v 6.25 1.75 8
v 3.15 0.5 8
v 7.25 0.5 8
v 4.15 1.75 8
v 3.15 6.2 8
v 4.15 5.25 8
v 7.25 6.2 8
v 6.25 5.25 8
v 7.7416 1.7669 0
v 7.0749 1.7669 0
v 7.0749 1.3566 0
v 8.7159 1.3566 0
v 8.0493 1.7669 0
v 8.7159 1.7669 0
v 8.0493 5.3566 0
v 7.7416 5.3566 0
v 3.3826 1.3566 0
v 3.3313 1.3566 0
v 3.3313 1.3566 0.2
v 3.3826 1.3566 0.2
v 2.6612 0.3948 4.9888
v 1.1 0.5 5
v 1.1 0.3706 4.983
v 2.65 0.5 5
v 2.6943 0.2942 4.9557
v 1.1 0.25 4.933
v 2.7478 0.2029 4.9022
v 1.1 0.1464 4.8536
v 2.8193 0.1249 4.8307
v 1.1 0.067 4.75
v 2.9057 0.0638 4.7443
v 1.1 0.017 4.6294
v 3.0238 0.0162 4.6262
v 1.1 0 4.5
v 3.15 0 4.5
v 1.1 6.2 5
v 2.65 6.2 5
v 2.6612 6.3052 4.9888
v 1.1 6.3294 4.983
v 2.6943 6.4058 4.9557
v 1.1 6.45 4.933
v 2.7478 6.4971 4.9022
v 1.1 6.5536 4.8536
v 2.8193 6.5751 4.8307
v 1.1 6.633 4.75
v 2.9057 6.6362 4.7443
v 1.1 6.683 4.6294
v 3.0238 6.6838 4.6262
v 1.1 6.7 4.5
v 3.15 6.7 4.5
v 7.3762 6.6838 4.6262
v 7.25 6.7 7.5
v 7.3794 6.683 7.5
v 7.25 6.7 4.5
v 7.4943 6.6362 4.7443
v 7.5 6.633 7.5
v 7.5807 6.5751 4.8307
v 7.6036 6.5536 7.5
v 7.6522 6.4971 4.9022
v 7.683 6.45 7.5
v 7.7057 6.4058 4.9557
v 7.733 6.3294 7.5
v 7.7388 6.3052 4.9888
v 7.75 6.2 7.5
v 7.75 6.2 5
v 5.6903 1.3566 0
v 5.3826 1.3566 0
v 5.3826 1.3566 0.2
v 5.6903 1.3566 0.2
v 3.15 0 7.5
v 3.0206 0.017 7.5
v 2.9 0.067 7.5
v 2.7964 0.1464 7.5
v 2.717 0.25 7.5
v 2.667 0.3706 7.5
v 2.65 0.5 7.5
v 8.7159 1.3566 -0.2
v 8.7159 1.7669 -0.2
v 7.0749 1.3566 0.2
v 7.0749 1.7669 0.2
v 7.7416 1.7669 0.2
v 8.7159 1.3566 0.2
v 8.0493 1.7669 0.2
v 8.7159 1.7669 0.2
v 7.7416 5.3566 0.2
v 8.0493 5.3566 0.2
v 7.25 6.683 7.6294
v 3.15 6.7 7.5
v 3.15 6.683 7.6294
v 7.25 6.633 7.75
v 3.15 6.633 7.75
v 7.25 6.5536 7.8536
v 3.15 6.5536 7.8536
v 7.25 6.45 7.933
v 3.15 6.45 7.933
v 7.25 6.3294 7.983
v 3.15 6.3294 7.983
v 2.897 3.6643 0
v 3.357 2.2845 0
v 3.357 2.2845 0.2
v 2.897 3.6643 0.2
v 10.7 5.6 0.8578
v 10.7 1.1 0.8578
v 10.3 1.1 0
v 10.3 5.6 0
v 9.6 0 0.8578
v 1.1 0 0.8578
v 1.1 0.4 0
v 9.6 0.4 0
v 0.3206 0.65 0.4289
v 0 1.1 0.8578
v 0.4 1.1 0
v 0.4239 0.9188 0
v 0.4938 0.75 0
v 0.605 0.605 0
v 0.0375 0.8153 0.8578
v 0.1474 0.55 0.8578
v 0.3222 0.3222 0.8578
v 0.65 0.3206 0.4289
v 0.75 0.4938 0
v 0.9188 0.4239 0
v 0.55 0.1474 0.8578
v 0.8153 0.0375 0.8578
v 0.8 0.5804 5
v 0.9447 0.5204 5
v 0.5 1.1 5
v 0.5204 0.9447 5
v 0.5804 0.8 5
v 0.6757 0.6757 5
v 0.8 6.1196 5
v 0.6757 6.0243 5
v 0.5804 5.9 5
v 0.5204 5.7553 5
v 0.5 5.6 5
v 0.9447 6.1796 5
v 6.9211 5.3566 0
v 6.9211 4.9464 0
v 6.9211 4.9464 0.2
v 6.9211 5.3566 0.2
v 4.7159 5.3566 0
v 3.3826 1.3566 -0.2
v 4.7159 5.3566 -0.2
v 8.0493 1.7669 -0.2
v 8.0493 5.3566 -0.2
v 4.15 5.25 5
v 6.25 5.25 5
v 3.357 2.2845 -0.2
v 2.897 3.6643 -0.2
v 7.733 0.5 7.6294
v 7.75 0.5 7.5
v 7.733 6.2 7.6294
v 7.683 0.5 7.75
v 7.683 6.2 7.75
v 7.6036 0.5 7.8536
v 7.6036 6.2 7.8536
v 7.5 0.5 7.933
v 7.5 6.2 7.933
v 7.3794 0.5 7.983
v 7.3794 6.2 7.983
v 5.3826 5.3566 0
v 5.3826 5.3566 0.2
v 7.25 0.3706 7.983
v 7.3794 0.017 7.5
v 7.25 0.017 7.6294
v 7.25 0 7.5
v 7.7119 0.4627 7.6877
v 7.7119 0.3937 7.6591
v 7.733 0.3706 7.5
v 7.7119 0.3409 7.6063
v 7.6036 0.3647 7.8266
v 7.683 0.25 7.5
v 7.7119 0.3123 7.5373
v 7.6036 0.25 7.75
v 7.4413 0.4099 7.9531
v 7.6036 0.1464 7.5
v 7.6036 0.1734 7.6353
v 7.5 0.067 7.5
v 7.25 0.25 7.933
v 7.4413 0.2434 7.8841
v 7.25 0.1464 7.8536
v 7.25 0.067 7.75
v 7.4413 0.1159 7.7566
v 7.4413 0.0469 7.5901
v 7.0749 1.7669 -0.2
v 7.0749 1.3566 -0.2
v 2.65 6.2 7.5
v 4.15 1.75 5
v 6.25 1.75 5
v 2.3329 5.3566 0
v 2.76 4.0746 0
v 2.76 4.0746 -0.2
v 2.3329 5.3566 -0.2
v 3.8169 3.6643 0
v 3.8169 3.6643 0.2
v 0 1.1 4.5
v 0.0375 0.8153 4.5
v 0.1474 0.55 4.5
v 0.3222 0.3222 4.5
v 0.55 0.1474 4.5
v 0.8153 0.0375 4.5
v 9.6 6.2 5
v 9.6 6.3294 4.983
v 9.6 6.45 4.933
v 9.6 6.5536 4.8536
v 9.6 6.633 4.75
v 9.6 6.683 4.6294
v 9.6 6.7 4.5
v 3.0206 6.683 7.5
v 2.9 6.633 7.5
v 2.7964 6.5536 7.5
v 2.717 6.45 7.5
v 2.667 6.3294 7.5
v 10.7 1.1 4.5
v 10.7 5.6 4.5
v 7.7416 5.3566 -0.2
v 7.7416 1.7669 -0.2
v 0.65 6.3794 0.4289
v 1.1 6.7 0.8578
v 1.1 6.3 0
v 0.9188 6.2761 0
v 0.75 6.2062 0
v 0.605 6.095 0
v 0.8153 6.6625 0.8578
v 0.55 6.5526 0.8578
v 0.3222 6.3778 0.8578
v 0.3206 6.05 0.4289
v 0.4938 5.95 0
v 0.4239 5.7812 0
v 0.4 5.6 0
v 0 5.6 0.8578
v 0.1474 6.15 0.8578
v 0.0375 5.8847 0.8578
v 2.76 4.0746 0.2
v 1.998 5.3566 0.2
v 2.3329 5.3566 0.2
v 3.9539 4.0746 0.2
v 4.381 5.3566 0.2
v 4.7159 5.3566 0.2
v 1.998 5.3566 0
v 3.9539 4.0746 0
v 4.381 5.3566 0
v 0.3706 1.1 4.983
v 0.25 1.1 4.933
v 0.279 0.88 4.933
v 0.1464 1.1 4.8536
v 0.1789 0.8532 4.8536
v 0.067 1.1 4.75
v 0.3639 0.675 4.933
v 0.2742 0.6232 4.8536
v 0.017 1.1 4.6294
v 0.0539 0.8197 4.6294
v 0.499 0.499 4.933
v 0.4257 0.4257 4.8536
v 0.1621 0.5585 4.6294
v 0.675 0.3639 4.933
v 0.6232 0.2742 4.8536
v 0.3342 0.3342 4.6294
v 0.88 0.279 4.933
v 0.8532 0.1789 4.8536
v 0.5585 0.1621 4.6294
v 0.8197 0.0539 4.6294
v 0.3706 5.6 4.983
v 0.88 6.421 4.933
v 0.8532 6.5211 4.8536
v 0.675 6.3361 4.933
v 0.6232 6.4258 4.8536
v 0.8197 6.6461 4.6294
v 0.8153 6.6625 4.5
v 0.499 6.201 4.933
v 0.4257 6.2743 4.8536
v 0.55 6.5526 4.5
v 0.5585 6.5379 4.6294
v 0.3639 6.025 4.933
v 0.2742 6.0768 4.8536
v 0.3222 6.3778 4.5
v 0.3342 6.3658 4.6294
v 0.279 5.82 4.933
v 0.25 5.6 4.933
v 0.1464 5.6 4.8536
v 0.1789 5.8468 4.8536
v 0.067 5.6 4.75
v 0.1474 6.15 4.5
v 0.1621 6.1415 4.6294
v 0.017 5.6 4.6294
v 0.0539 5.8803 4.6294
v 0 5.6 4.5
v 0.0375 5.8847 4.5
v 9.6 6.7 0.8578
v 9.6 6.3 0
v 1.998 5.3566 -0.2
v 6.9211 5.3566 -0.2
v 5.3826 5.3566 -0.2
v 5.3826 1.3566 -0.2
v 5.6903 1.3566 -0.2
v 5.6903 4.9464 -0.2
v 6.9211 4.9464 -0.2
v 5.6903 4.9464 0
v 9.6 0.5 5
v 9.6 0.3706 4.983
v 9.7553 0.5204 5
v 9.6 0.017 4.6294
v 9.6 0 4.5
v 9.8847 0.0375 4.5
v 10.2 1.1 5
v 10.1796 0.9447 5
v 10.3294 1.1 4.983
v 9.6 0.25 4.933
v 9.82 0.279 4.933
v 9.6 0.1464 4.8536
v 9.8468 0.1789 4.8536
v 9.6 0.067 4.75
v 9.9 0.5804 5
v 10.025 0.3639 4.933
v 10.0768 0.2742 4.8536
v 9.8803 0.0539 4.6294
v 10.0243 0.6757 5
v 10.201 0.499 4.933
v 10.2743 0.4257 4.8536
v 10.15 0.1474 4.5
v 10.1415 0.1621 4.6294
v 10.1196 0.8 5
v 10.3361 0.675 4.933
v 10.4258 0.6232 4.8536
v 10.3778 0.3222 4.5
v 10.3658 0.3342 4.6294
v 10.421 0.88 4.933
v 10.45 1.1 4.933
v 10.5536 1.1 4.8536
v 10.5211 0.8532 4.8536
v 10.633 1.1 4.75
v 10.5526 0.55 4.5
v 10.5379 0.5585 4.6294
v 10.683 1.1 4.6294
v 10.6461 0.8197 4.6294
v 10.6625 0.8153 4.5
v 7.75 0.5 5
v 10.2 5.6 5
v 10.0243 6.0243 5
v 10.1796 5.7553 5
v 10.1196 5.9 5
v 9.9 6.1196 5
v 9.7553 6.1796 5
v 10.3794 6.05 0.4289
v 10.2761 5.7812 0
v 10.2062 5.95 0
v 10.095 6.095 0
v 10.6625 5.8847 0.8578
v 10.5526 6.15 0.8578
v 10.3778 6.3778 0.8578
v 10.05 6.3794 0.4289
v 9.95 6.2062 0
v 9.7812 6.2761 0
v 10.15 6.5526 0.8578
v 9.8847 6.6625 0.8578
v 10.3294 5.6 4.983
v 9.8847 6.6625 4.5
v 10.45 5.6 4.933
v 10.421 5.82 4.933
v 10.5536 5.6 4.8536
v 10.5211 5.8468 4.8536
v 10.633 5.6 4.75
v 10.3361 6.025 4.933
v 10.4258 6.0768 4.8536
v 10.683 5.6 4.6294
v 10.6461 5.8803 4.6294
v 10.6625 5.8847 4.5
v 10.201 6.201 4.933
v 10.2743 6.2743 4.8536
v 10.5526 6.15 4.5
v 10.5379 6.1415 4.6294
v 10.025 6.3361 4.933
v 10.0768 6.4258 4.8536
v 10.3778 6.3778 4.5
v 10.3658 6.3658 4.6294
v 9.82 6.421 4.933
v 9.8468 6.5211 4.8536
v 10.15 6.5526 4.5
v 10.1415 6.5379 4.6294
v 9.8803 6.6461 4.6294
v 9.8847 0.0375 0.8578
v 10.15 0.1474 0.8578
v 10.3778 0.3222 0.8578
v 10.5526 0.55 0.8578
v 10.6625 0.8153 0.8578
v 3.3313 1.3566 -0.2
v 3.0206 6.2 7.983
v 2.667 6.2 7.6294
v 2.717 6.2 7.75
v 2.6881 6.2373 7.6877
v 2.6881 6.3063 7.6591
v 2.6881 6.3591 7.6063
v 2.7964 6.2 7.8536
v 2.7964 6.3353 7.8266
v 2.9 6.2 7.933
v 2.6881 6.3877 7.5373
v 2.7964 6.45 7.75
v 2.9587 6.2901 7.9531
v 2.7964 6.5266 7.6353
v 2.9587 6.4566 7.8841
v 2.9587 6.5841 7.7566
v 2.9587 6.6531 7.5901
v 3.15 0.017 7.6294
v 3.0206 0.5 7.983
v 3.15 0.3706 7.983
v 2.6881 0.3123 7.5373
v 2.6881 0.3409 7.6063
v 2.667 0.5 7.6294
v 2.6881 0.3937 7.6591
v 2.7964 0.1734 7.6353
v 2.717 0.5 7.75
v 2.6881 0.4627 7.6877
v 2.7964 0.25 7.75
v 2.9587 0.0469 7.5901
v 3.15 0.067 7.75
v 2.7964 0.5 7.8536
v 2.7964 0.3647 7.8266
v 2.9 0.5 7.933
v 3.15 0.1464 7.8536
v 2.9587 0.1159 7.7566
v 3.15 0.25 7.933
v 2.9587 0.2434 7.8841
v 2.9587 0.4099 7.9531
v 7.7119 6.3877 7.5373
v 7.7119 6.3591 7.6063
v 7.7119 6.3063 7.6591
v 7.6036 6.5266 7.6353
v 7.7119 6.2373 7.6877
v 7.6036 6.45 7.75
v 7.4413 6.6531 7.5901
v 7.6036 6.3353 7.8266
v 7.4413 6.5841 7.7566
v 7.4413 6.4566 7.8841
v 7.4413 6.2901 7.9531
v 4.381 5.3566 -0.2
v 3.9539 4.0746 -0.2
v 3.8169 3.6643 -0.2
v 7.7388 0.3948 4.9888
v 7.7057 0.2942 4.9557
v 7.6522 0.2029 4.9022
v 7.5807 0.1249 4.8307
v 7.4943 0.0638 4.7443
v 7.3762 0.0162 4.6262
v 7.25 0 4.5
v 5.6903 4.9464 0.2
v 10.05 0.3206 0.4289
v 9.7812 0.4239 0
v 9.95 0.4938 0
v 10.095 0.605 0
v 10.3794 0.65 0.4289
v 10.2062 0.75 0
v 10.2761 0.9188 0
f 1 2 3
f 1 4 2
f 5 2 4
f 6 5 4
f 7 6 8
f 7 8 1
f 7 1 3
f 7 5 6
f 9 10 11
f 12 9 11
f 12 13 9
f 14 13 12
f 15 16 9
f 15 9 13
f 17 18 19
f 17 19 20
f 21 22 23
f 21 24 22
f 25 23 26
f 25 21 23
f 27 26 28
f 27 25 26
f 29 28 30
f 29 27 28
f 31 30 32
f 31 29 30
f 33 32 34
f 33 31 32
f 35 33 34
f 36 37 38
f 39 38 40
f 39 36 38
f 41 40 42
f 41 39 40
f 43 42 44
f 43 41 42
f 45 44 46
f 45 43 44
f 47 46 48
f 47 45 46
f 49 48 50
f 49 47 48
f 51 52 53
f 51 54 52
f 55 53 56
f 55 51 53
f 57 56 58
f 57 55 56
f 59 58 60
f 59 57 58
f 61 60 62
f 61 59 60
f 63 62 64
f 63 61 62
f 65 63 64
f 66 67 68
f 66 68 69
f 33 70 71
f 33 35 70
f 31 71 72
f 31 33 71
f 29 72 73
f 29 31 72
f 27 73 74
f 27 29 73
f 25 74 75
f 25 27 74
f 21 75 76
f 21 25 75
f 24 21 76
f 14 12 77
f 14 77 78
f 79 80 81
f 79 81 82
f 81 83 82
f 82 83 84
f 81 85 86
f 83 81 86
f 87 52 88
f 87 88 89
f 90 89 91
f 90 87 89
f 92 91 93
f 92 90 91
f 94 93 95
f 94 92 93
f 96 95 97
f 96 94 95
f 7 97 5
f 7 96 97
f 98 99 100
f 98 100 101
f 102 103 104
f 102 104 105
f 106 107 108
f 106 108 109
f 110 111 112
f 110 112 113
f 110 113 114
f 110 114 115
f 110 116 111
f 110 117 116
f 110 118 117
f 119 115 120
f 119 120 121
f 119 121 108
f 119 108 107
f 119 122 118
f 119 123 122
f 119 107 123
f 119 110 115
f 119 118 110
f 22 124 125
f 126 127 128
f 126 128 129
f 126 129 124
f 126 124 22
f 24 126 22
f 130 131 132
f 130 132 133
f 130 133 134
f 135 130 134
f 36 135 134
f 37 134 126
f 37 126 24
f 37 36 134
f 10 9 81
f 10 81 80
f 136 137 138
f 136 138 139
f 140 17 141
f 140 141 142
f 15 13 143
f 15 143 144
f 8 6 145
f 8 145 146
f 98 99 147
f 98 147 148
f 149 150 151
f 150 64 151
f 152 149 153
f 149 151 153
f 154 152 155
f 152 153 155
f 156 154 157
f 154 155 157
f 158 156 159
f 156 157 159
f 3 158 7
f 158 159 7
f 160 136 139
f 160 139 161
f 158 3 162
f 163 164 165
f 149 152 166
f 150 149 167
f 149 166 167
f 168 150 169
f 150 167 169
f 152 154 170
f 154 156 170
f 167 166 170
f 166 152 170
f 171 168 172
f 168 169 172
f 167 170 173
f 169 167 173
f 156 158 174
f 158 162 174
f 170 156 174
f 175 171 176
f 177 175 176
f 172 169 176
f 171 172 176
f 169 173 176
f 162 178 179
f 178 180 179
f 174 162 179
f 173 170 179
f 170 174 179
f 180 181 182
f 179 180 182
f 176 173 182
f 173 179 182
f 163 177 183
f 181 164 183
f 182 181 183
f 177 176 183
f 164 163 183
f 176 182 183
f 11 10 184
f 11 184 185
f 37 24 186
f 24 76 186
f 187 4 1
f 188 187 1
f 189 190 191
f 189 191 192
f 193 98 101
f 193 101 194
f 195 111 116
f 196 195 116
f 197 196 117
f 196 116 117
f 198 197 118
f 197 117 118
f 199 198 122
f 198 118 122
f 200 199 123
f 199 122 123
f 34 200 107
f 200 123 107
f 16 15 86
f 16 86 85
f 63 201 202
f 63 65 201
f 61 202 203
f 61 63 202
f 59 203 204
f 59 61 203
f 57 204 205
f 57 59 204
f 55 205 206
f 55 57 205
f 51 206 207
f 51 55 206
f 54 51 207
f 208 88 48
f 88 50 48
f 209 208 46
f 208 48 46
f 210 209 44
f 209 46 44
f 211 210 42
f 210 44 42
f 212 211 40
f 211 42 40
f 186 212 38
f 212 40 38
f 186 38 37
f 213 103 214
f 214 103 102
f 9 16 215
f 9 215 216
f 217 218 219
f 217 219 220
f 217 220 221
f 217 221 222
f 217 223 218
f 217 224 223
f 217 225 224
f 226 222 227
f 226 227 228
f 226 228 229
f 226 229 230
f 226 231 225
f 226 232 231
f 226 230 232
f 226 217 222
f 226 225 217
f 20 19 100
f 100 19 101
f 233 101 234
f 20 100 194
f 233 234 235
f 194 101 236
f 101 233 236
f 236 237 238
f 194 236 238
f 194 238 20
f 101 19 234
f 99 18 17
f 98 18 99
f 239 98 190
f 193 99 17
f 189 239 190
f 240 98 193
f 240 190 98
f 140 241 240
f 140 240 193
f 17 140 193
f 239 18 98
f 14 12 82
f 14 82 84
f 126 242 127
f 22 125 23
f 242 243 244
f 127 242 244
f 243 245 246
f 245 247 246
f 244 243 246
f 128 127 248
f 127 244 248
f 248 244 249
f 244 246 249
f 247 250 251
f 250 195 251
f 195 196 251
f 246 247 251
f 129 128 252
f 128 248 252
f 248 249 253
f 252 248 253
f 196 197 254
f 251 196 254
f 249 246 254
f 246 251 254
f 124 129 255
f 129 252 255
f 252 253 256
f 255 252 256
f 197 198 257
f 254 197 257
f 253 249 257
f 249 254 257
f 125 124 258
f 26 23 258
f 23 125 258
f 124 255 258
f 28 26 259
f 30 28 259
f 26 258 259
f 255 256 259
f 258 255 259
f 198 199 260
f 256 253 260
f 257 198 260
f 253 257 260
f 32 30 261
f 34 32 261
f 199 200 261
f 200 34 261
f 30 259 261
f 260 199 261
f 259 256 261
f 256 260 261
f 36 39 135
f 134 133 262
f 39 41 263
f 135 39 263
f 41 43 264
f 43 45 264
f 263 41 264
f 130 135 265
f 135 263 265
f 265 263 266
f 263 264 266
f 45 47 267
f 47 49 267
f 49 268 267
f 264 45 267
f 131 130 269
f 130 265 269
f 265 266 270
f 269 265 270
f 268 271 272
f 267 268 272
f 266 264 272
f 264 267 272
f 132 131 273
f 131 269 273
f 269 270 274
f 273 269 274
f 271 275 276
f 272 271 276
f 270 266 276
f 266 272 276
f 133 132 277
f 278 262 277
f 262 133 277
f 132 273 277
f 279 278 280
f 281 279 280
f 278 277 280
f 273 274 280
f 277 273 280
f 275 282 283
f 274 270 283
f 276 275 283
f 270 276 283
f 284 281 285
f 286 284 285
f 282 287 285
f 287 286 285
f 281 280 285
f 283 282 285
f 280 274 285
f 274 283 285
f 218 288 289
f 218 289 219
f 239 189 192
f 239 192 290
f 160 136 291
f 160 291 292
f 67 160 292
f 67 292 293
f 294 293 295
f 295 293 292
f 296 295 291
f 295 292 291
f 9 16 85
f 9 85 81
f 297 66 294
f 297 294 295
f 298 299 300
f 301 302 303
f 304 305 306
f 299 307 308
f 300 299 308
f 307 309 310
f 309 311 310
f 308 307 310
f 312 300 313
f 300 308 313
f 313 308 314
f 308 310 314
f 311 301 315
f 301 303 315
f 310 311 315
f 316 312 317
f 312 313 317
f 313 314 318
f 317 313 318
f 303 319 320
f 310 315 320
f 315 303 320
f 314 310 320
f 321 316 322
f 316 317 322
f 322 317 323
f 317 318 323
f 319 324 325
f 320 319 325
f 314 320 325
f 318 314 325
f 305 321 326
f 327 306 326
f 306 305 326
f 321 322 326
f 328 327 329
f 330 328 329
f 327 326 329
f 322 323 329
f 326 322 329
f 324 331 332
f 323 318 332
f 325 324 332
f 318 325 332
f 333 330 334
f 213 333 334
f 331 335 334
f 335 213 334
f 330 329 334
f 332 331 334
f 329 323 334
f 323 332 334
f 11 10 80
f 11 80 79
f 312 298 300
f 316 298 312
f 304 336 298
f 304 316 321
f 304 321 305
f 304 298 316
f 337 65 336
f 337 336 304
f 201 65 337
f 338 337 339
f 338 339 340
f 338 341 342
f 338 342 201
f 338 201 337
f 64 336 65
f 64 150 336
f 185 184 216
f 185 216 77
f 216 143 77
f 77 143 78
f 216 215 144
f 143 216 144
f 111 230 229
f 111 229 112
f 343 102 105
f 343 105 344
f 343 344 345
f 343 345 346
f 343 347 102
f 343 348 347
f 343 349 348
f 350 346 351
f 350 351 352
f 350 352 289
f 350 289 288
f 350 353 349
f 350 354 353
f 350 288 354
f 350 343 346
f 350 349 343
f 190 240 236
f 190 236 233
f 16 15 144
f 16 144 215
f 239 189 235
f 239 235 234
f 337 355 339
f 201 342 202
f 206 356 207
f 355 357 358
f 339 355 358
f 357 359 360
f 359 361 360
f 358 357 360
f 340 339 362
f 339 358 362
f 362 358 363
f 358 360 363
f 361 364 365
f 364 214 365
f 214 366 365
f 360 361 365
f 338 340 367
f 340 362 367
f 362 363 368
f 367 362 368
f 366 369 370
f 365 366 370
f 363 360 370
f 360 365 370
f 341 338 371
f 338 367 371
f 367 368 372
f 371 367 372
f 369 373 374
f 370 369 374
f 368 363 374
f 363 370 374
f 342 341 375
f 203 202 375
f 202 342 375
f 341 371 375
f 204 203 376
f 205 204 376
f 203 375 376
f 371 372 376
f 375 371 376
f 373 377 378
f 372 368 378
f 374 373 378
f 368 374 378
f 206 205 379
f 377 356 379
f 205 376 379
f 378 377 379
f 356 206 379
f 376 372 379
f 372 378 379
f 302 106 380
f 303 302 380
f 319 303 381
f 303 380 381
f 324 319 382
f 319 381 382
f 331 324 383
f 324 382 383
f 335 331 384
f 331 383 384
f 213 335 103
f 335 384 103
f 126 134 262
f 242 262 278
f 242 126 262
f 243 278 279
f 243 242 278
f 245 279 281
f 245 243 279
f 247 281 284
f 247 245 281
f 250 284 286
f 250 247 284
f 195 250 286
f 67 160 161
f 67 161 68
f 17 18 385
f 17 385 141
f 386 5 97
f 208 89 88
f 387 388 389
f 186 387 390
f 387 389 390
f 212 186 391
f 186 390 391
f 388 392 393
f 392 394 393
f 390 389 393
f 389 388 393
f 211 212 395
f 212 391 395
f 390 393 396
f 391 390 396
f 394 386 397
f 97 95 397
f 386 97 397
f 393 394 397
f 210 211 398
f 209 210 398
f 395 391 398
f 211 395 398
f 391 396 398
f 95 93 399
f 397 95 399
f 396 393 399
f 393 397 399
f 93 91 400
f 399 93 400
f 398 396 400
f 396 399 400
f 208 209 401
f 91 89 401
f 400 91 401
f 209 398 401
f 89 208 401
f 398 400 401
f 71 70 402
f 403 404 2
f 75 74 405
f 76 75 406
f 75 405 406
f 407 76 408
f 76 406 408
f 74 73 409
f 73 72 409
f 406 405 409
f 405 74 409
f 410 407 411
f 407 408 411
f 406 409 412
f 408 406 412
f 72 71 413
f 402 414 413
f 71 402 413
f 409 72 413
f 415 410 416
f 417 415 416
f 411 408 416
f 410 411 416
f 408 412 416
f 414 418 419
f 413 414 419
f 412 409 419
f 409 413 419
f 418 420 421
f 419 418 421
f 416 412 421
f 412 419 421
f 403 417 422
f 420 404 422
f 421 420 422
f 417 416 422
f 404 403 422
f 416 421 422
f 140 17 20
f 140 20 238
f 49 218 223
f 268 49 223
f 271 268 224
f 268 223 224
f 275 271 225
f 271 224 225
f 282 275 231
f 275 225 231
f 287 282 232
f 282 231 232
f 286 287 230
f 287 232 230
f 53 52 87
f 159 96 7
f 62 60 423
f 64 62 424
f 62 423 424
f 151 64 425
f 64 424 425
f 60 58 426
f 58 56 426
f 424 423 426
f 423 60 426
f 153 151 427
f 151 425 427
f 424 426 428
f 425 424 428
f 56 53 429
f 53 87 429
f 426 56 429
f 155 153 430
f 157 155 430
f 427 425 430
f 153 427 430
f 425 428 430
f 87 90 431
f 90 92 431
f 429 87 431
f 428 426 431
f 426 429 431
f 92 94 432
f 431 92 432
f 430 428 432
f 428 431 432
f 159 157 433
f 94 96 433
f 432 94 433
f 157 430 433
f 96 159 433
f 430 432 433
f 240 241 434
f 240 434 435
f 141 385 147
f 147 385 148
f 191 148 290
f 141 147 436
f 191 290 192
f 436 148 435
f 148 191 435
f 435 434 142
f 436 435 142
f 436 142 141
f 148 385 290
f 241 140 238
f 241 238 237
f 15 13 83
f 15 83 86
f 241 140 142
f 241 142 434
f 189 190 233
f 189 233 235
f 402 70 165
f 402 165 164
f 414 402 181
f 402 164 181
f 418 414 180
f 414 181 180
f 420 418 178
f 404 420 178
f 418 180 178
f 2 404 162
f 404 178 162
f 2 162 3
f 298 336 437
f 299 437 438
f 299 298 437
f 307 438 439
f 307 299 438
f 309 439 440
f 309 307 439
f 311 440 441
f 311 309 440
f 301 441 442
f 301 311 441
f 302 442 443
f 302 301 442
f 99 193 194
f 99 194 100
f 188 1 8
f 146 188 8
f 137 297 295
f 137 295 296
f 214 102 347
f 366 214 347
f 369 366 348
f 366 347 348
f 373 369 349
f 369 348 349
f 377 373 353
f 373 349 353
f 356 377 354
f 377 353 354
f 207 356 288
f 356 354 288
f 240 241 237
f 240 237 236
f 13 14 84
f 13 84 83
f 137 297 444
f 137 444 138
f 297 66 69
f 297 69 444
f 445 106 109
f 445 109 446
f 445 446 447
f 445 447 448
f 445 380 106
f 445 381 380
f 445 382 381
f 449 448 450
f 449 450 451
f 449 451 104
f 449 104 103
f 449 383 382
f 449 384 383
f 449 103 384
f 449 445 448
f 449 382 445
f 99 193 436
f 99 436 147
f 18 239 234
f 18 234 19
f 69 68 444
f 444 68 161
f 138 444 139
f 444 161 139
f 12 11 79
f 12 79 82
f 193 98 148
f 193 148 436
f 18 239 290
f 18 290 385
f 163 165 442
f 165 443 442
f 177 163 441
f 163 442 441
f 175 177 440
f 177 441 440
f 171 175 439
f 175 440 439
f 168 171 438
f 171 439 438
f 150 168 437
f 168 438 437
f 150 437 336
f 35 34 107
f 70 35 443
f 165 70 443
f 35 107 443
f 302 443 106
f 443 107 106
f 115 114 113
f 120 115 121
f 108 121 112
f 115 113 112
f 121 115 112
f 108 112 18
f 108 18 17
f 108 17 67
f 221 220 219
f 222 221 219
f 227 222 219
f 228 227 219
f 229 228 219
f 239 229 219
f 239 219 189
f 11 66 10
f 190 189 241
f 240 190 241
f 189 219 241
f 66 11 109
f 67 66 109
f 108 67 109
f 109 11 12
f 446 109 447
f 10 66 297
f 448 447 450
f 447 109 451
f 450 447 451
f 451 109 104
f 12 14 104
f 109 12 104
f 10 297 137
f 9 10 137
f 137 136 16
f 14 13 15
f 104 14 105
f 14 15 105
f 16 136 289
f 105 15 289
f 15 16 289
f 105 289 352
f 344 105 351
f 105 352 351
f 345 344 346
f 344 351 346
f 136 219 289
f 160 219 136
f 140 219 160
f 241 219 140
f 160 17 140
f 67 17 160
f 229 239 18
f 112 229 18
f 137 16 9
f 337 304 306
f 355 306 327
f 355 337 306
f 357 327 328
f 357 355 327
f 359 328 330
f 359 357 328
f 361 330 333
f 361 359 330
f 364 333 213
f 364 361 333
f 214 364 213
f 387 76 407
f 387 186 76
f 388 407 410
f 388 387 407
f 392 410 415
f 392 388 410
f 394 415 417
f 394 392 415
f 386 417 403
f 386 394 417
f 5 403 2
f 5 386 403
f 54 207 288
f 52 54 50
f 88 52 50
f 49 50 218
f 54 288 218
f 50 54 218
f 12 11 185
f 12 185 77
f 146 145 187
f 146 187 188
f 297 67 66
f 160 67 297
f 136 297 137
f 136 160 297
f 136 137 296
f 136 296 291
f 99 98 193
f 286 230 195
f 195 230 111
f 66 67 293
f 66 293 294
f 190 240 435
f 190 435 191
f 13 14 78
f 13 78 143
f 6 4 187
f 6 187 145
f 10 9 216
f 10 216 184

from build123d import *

# Parameters (mm, degrees)
BOSS_EXTRU_1_DEPTH      = 8
ESQUISSE3_W             = 2.1
ESQUISSE3_H             = 3.5
ENL_V_MAT_EXTRU_1_DEPTH = 3
ESQUISSE4_OUTSIDE_W     = 15.69
ESQUISSE4_OUTSIDE_H     = 11.69
ESQUISSE4_OUTSIDE_W_2   = 5.1
ESQUISSE4_OUTSIDE_H_2   = 6.7
ENL_V_MAT_EXTRU_2_DEPTH = 3
CONG_1_R                = 0.5
CHANFREIN1_SIZE         = 0.4
CHANFREIN1_SIZE2        = 0.857802768
ENL_V_MAT_EXTRU_3_DEPTH = 0.2
BOSS_EXTRU_2_DEPTH      = 0.2
BOSS_EXTRU_2_2_DEPTH    = 0.2
BOSS_EXTRU_2_3_DEPTH    = 0.2


with BuildPart() as part:
    # Esquisse2 → Boss.-Extru.1 (new body)
    with BuildSketch(Plane.XY):
        with BuildLine():
            Line((1.1, 0), (9.6, 0))
            ThreePointArc((9.6, 0), (10.377817459, 0.322182541), (10.7, 1.1))
            Line((10.7, 1.1), (10.7, 5.6))
            ThreePointArc((10.7, 5.6), (10.377817459, 6.377817459), (9.6, 6.7))
            Line((9.6, 6.7), (1.1, 6.7))
            ThreePointArc((1.1, 6.7), (0.322182541, 6.377817459), (0, 5.6))
            Line((0, 5.6), (0, 1.1))
            ThreePointArc((0, 1.1), (0.322182541, 0.322182541), (1.1, 0))
        make_face()
    extrude(amount=BOSS_EXTRU_1_DEPTH)

    # Esquisse3 → Enlèv. mat.-Extru.1 (cut)
    with BuildSketch(Plane.XY.offset(8)):
        with Locations((5.2, 3.5)):
            Rectangle(ESQUISSE3_W, ESQUISSE3_H)
    extrude(amount=-ENL_V_MAT_EXTRU_1_DEPTH, mode=Mode.SUBTRACT)

    # Esquisse4 outside → Enlèv. mat.-Extru.2 (cut)
    with BuildSketch(Plane.XY.offset(8)):
        with Locations((5.35, 3.35)):
            Rectangle(ESQUISSE4_OUTSIDE_W, ESQUISSE4_OUTSIDE_H)
        with Locations((5.2, 3.35)):
            Rectangle(ESQUISSE4_OUTSIDE_W_2, ESQUISSE4_OUTSIDE_H_2, mode=Mode.SUBTRACT)
    extrude(amount=-ENL_V_MAT_EXTRU_2_DEPTH, mode=Mode.SUBTRACT)

    # Congé1
    cong_1_edges = [part.edges().sort_by_distance(p)[0] for p in [
        (8.675, 0, 5),
        (10.377817459, 0.322182541, 5),
        (10.7, 3.35, 5),
        (10.377817459, 6.377817459, 5),
        (1.875, 6.7, 5),
        (0.322182541, 6.377817459, 5),
        (1.875, 0, 5),
        (0.322182541, 0.322182541, 5),
        (7.75, 6.7, 6.5),
        (2.65, 6.7, 6.5),
        (7.75, 0, 6.5),
        (2.65, 0, 6.5),
        (2.65, 3.35, 8),
        (5.2, 6.7, 8),
        (7.75, 3.35, 8),
        (5.2, 0, 8),
        (8.675, 6.7, 5),
        (0, 3.35, 5),
    ]]
    fillet(cong_1_edges, radius=CONG_1_R)

    # Chanfrein1
    chanfrein1_edges = [part.edges().sort_by_distance(p)[0] for p in [
        (5.35, 0, 0),
        (10.377817459, 0.322182541, 0),
        (0.322182541, 0.322182541, 0),
        (10.7, 3.35, 0),
        (0, 3.35, 0),
        (10.377817459, 6.377817459, 0),
        (0.322182541, 6.377817459, 0),
        (5.35, 6.7, 0),
    ]]
    chanfrein1_side = [part.faces().sort_by_distance(p)[0] for p in [
        (5.35, 3.35, 0),
    ]]
    chamfer(chanfrein1_edges, length=CHANFREIN1_SIZE, length2=CHANFREIN1_SIZE2, reference=chanfrein1_side[0])

    # Esquisse5 → Enlèv. mat.-Extru.3 (cut)
    # profile 1 of 3: a face of its own
    with BuildSketch(Plane.XY):
        Polygon((3.382593084, 1.356639893), (4.715926417, 5.356639893), (4.38099052, 5.356639893), (3.953907187, 4.074588611), (2.75999693, 4.074588611), (2.332913597, 5.356639893), (1.997977699, 5.356639893), (3.331311033, 1.356639893), align=None)
        Polygon((3.356952058, 2.284524508), (2.897016161, 3.6643322), (3.816887956, 3.6643322), align=None, mode=Mode.SUBTRACT)
    # profile 2 of 3: a face of its own
    with BuildSketch(Plane.XY):
        Polygon((5.382593084, 1.356639893), (5.690285392, 1.356639893), (5.690285392, 4.946383482), (6.921054623, 4.946383482), (6.921054623, 5.356639893), (5.382593084, 5.356639893), align=None)
    # profile 3 of 3: a face of its own
    with BuildSketch(Plane.XY):
        Polygon((7.074900776, 1.766896303), (7.074900776, 1.356639893), (8.715926417, 1.356639893), (8.715926417, 1.766896303), (8.049259751, 1.766896303), (8.049259751, 5.356639893), (7.741567443, 5.356639893), (7.741567443, 1.766896303), align=None)
    extrude(amount=ENL_V_MAT_EXTRU_3_DEPTH, mode=Mode.SUBTRACT)


with BuildPart() as body_2:
    # Esquisse5<4> → Boss.-Extru.2 (new body)
    with BuildSketch(Plane.XY):
        Polygon((3.382593084, 1.356639893), (4.715926417, 5.356639893), (4.38099052, 5.356639893), (3.953907187, 4.074588611), (2.75999693, 4.074588611), (2.332913597, 5.356639893), (1.997977699, 5.356639893), (3.331311033, 1.356639893), align=None)
        Polygon((3.356952058, 2.284524508), (2.897016161, 3.6643322), (3.816887956, 3.6643322), align=None, mode=Mode.SUBTRACT)
    extrude(amount=-BOSS_EXTRU_2_DEPTH)


with BuildPart() as body_3:
    # Esquisse5<4> → Boss.-Extru.2 2 (new body)
    with BuildSketch(Plane.XY):
        Polygon((5.382593084, 1.356639893), (5.690285392, 1.356639893), (5.690285392, 4.946383482), (6.921054623, 4.946383482), (6.921054623, 5.356639893), (5.382593084, 5.356639893), align=None)
    extrude(amount=-BOSS_EXTRU_2_2_DEPTH)


with BuildPart() as body_4:
    # Esquisse5<4> → Boss.-Extru.2 3 (new body)
    with BuildSketch(Plane.XY):
        Polygon((7.074900776, 1.766896303), (7.074900776, 1.356639893), (8.715926417, 1.356639893), (8.715926417, 1.766896303), (8.049259751, 1.766896303), (8.049259751, 5.356639893), (7.741567443, 5.356639893), (7.741567443, 1.766896303), align=None)
    extrude(amount=-BOSS_EXTRU_2_3_DEPTH)


solid = Compound([part.part, body_2.part, body_3.part, body_4.part])
